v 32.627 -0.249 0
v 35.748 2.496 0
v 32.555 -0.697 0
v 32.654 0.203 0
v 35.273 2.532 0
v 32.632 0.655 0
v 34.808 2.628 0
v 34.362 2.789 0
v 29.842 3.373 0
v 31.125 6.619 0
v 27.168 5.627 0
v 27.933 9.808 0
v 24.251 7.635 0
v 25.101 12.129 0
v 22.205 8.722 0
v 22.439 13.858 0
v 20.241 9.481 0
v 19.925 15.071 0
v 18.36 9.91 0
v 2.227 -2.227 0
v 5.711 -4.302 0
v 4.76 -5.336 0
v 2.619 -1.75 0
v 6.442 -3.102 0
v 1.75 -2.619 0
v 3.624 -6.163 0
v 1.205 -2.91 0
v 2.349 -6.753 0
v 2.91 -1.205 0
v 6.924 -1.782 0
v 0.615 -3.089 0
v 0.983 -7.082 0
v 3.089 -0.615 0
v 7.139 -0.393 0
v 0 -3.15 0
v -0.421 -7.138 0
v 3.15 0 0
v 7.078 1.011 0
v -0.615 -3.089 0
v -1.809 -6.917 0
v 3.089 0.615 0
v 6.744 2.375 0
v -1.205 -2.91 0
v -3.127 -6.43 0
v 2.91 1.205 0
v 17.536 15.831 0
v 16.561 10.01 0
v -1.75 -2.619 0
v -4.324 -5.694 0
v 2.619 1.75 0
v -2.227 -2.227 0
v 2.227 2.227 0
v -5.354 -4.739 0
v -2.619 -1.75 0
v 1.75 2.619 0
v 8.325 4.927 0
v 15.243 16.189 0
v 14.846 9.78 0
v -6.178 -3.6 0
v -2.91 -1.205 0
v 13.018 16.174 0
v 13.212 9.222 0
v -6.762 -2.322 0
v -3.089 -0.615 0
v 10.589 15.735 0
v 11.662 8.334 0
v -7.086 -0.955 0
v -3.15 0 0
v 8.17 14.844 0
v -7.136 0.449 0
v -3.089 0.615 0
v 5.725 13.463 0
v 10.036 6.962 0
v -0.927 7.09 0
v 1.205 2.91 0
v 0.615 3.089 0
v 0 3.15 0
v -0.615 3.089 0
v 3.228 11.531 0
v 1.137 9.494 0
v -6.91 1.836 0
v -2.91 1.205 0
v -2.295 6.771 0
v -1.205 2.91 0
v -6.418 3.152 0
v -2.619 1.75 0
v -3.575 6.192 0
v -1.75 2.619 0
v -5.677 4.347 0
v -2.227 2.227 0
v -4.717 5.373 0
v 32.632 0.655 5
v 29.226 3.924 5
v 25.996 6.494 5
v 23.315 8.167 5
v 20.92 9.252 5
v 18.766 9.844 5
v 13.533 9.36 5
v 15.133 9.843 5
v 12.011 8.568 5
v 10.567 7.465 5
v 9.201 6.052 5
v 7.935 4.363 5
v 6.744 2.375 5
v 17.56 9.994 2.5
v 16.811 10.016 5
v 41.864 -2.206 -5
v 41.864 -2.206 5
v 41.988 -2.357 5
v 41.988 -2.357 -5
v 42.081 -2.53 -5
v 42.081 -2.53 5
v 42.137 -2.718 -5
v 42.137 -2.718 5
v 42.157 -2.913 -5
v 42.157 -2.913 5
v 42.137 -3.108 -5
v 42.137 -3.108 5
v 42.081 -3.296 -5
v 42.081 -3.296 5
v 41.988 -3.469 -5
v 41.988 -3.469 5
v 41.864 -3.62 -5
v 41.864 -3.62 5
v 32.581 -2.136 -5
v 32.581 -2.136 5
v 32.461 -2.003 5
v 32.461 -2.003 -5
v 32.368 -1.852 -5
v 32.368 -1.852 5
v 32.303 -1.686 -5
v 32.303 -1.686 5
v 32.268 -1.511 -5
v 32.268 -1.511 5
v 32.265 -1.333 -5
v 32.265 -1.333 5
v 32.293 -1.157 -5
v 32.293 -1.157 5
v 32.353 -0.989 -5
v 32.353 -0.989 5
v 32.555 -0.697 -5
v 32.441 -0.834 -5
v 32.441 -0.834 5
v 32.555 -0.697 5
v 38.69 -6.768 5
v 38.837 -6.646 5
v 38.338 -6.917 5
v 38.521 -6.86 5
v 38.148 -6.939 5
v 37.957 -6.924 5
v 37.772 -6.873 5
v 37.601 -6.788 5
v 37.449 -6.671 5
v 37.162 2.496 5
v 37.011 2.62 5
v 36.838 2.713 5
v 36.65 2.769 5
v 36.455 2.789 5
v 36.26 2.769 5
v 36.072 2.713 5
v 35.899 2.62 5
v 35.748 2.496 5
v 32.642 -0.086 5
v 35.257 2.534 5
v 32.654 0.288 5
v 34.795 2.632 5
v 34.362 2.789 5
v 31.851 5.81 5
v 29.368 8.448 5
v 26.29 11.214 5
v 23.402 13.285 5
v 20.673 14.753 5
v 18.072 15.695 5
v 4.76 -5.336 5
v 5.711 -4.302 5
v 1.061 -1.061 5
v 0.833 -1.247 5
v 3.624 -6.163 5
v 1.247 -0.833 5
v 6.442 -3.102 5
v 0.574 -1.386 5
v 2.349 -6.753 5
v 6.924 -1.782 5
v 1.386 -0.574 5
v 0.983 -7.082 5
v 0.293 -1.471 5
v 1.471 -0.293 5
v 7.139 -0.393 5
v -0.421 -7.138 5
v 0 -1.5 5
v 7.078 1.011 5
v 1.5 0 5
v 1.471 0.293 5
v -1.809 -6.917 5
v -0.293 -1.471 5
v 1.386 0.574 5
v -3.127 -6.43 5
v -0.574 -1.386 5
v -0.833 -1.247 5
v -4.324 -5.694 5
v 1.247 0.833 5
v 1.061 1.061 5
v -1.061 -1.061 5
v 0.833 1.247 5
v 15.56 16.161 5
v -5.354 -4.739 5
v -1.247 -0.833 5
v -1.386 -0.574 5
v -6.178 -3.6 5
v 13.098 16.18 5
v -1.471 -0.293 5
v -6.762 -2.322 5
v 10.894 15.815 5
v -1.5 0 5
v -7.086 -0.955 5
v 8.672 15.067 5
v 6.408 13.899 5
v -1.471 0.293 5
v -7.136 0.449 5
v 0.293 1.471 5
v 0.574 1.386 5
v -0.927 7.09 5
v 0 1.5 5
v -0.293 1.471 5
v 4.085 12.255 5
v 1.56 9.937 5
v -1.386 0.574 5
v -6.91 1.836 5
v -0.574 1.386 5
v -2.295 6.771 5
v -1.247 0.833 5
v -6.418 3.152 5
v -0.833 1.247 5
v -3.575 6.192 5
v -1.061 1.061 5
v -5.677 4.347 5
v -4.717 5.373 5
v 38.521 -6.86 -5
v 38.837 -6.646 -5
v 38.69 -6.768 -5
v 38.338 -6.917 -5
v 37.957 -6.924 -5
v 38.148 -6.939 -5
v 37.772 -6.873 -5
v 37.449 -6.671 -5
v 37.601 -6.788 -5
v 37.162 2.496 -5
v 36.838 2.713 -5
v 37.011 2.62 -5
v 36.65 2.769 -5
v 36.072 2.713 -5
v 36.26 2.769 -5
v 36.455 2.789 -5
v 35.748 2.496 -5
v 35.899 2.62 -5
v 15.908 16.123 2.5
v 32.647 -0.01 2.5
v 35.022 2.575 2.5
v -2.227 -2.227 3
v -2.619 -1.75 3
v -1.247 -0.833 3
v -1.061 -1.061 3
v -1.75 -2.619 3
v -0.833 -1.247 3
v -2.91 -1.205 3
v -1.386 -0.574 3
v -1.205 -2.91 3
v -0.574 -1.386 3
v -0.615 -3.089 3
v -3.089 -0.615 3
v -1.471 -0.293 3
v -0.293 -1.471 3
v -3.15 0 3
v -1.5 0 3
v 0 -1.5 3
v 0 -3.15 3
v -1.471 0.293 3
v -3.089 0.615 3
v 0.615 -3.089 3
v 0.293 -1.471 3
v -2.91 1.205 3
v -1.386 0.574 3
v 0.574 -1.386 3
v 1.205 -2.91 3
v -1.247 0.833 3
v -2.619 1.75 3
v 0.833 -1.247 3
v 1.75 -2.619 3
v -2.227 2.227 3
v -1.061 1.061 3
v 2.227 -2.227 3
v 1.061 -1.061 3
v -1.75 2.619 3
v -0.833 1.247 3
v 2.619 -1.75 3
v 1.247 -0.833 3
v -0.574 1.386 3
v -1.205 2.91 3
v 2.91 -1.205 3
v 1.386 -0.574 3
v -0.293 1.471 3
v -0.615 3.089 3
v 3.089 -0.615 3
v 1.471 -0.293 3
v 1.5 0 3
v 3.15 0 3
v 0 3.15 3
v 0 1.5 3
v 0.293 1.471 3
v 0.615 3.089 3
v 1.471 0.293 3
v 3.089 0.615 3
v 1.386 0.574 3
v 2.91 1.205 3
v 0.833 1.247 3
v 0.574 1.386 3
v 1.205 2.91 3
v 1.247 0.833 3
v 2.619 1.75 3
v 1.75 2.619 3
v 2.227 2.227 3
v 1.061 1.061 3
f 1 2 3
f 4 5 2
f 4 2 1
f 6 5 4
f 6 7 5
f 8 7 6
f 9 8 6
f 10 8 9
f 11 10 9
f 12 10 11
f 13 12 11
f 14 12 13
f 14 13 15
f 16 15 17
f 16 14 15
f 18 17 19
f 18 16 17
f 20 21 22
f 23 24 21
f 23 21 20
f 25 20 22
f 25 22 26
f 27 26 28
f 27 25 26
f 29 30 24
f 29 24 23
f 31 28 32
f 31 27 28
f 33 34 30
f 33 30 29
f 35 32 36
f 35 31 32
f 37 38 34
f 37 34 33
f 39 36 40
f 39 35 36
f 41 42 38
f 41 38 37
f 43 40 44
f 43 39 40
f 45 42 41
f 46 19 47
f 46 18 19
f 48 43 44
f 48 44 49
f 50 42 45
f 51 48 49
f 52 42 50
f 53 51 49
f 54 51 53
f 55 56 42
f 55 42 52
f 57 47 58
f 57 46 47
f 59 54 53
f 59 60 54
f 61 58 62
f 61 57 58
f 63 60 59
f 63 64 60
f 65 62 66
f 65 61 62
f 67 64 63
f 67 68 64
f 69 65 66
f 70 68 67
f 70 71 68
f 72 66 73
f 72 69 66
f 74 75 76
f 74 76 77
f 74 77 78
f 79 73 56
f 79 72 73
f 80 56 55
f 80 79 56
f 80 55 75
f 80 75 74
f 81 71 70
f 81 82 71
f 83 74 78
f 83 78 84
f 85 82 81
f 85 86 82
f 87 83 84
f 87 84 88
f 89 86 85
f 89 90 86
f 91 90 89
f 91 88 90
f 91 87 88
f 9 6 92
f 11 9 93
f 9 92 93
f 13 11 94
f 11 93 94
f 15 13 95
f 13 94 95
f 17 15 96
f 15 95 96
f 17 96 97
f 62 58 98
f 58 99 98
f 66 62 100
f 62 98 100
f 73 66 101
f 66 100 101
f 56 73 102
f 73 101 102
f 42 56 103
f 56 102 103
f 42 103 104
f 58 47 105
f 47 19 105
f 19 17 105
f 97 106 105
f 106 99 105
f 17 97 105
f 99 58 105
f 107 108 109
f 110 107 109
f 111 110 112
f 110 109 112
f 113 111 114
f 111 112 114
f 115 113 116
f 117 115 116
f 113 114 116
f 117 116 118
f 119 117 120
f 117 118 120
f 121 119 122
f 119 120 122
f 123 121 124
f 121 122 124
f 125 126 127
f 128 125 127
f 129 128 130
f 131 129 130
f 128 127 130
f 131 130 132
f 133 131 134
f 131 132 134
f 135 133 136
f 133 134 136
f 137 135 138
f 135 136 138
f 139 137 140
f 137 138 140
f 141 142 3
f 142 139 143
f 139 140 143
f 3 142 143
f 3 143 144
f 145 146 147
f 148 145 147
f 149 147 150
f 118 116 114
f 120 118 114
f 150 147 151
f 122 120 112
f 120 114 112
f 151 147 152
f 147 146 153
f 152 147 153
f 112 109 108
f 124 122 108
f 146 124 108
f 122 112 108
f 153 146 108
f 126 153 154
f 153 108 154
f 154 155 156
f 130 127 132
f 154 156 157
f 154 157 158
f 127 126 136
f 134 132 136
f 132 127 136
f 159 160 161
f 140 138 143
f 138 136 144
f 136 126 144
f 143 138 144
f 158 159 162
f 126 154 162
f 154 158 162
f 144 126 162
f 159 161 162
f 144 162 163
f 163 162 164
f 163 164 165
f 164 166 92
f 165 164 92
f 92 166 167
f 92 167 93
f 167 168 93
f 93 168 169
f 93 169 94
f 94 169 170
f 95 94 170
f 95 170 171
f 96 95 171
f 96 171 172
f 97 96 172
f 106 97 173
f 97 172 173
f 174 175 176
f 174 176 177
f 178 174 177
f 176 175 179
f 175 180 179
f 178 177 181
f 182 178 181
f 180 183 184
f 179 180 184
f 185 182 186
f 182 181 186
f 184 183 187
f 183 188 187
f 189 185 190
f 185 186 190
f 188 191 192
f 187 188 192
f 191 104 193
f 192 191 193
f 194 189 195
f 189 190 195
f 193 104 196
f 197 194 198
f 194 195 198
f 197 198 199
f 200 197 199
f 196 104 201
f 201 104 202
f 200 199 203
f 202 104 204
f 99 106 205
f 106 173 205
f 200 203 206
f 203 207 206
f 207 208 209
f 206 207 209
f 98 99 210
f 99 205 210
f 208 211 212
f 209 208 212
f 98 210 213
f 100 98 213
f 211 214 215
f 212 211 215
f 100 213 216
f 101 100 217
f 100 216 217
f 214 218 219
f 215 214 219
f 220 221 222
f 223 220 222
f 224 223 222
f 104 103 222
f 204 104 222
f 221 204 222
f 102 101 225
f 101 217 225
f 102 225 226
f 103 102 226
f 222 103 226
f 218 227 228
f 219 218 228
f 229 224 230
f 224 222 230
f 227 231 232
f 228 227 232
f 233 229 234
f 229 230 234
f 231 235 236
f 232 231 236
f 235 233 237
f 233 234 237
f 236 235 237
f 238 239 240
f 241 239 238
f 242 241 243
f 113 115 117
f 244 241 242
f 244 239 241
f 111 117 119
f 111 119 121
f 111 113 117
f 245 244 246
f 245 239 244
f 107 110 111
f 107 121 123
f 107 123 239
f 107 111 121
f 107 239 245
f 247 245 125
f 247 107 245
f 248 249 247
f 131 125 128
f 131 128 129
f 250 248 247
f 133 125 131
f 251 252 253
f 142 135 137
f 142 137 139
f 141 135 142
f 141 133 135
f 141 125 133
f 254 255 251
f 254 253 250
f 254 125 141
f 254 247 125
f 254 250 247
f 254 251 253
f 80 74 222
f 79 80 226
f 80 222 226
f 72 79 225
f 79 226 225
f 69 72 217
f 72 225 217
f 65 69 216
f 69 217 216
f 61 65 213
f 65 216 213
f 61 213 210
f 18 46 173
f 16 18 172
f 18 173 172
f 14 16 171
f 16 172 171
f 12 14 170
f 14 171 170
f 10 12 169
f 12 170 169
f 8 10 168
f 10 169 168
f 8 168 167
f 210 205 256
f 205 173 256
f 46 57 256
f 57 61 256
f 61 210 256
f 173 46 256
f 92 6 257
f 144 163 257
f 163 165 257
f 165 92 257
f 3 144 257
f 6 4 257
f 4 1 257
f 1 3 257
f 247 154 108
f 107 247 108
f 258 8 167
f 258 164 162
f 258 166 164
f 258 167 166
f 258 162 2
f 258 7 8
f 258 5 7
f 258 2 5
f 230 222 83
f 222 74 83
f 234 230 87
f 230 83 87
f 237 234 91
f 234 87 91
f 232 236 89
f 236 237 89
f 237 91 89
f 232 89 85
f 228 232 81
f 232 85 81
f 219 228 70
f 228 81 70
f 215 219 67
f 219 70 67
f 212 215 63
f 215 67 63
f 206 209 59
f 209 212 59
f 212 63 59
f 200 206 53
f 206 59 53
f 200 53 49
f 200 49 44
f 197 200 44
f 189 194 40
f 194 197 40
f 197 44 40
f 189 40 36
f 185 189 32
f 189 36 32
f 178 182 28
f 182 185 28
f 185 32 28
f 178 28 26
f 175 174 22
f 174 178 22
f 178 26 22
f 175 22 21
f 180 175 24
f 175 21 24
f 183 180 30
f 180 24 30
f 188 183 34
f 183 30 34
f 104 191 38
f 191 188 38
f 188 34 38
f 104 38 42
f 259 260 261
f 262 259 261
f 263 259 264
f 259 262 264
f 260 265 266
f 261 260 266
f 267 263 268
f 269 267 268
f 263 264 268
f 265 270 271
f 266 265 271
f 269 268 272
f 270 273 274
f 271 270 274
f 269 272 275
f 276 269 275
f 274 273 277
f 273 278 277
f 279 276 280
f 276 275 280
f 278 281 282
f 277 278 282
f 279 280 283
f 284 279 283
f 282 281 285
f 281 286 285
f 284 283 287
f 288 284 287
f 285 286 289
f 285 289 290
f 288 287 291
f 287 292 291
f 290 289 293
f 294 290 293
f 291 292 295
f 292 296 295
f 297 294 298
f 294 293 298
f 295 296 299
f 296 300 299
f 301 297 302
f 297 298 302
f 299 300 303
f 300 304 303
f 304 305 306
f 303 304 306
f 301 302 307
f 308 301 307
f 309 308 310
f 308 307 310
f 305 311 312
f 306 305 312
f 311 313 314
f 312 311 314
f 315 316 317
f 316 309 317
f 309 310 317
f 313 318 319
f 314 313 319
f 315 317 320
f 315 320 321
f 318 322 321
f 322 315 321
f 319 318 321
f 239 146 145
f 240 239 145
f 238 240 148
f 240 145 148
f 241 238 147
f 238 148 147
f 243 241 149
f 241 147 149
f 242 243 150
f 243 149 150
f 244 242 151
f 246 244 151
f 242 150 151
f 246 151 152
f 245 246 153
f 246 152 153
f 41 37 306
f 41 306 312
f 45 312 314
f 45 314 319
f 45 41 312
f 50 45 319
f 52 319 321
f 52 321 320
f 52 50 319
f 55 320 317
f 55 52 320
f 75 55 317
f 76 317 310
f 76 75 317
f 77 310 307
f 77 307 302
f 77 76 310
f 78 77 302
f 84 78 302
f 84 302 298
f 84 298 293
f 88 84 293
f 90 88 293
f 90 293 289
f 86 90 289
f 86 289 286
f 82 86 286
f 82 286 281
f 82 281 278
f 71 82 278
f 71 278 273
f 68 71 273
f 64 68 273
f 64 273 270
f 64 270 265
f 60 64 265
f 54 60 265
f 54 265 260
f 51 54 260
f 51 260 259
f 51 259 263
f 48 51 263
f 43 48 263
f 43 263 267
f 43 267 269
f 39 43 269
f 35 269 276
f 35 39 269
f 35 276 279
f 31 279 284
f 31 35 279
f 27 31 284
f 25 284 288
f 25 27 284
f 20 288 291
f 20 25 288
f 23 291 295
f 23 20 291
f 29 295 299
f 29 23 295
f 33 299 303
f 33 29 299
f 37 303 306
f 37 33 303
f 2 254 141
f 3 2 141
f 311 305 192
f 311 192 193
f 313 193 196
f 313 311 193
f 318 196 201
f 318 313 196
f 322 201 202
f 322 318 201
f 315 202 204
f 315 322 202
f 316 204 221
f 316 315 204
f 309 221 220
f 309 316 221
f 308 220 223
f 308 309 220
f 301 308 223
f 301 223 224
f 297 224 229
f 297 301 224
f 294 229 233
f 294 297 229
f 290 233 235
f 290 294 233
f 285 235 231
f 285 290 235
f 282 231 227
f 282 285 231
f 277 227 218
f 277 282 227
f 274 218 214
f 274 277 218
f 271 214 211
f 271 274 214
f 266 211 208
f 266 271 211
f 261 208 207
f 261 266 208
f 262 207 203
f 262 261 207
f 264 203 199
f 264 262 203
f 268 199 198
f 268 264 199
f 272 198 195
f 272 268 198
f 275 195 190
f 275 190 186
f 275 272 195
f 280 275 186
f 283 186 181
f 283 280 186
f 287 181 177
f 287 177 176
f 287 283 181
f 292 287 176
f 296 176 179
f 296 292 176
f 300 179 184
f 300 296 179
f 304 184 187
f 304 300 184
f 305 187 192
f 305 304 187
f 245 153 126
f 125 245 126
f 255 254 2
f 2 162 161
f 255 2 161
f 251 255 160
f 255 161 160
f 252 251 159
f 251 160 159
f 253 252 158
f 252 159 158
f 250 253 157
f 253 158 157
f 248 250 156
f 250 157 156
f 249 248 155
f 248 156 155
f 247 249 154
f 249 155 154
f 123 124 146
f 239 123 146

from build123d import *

# Parameters (mm, degrees)
ESQUISSE1_R             = 7.15
ESQUISSE1_R_2           = 3.15
BOSS_EXTRU_1_DEPTH      = 5
BOSS_EXTRU_2_DEPTH      = 5
BOSS_EXTRU_3_START      = -2
ESQUISSE3_R             = 3.15
ESQUISSE3_R_2           = 1.5
BOSS_EXTRU_3_DEPTH      = 2
BOSS_EXTRU_5_DEPTH      = 10
ENL_V_MAT_EXTRU_1_DEPTH = 5


with BuildPart() as part:
    # Esquisse1 → Boss.-Extru.1 (new body)
    with BuildSketch(Plane.XY):
        Circle(ESQUISSE1_R)
        Circle(ESQUISSE1_R_2, mode=Mode.SUBTRACT)
    extrude(amount=BOSS_EXTRU_1_DEPTH)

    # Esquisse2 → Boss.-Extru.2 (add)
    with BuildSketch(Plane.XY.offset(5)):
        with BuildLine():
            Line((-0.926838299, 7.08967353), (6.743880262, 2.375411335))
            add(Edge.make_bspline(
                [(34.021054956, -0.824268448), (15.778325112, 19.117081856), (6.743880262, 2.375411335)],
                knots=[0, 0, 0, 1, 1, 1], degree=2))
            add(Edge.make_bspline(
                [(35.905224024, 0.760247249), (37.183183912, -2.67189548), (34.021054956, -0.824268448)],
                knots=[0, 0, 0, 1, 1, 1], degree=2))
            add(Edge.make_bspline(
                [(-0.926838299, 7.08967353), (15.737638427, 28.114370549), (35.905224024, 0.760247249)],
                knots=[0, 0, 0, 1, 1, 1], degree=2))
        make_face()
    extrude(amount=-BOSS_EXTRU_2_DEPTH)

    # Esquisse3 → Boss.-Extru.3 (add)
    with BuildSketch(Plane.XY.offset(5).offset(BOSS_EXTRU_3_START)):
        Circle(ESQUISSE3_R)
        Circle(ESQUISSE3_R_2, mode=Mode.SUBTRACT)
    extrude(amount=BOSS_EXTRU_3_DEPTH)

    # Esquisse6 → Boss.-Extru.5 (add)
    with BuildSketch(Plane.XY.offset(5)):
        with BuildLine():
            Line((37.162166163, 2.495785683), (41.863791518, -2.205839672))
            ThreePointArc((41.863791518, -2.205839672), (42.156684737, -2.912946454), (41.863791518, -3.620053235))
            Line((41.863791518, -3.620053235), (38.837480033, -6.646364721))
            ThreePointArc((38.837480033, -6.646364721), (38.148081452, -6.939101137), (37.448749191, -6.670960502))
            Line((37.448749191, -6.670960502), (32.580530811, -2.135928171))
            ThreePointArc((32.580530811, -2.135928171), (32.262311674, -1.421933809), (32.55504809, -0.697118827))
            add(Edge.make_bspline(
                [(32.55504809, -0.697118827), (33.011349081, 1.483281056), (31.368103593, 3.24060207)],
                knots=[0, 0, 0, 1, 1, 1], degree=2))
            Line((31.368103593, 3.24060207), (32.92139501, 4.017247779))
            add(Edge.make_bspline(
                [(35.7479526, 2.495785683), (33.974850615, 2.525051405), (32.92139501, 4.017247779)],
                knots=[0, 0, 0, 1, 1, 1], degree=2))
            ThreePointArc((35.7479526, 2.495785683), (36.455059382, 2.788678902), (37.162166163, 2.495785683))
        make_face()
    extrude(amount=-BOSS_EXTRU_5_DEPTH)

    # Esquisse7 → Enlèv. mat.-Extru.1 (cut)
    with BuildSketch(Plane(origin=(0, 0, -5), x_dir=(-1, 0, 0), z_dir=(0, 0, -1))):
        Polygon((-35.7479526, 2.495785683), (-32.55504809, -0.697118827), (-29.617226271, 2.240702992), (-34.427657246, 5.5904913), align=None)
    extrude(amount=-ENL_V_MAT_EXTRU_1_DEPTH, mode=Mode.SUBTRACT)


solid = part.part
